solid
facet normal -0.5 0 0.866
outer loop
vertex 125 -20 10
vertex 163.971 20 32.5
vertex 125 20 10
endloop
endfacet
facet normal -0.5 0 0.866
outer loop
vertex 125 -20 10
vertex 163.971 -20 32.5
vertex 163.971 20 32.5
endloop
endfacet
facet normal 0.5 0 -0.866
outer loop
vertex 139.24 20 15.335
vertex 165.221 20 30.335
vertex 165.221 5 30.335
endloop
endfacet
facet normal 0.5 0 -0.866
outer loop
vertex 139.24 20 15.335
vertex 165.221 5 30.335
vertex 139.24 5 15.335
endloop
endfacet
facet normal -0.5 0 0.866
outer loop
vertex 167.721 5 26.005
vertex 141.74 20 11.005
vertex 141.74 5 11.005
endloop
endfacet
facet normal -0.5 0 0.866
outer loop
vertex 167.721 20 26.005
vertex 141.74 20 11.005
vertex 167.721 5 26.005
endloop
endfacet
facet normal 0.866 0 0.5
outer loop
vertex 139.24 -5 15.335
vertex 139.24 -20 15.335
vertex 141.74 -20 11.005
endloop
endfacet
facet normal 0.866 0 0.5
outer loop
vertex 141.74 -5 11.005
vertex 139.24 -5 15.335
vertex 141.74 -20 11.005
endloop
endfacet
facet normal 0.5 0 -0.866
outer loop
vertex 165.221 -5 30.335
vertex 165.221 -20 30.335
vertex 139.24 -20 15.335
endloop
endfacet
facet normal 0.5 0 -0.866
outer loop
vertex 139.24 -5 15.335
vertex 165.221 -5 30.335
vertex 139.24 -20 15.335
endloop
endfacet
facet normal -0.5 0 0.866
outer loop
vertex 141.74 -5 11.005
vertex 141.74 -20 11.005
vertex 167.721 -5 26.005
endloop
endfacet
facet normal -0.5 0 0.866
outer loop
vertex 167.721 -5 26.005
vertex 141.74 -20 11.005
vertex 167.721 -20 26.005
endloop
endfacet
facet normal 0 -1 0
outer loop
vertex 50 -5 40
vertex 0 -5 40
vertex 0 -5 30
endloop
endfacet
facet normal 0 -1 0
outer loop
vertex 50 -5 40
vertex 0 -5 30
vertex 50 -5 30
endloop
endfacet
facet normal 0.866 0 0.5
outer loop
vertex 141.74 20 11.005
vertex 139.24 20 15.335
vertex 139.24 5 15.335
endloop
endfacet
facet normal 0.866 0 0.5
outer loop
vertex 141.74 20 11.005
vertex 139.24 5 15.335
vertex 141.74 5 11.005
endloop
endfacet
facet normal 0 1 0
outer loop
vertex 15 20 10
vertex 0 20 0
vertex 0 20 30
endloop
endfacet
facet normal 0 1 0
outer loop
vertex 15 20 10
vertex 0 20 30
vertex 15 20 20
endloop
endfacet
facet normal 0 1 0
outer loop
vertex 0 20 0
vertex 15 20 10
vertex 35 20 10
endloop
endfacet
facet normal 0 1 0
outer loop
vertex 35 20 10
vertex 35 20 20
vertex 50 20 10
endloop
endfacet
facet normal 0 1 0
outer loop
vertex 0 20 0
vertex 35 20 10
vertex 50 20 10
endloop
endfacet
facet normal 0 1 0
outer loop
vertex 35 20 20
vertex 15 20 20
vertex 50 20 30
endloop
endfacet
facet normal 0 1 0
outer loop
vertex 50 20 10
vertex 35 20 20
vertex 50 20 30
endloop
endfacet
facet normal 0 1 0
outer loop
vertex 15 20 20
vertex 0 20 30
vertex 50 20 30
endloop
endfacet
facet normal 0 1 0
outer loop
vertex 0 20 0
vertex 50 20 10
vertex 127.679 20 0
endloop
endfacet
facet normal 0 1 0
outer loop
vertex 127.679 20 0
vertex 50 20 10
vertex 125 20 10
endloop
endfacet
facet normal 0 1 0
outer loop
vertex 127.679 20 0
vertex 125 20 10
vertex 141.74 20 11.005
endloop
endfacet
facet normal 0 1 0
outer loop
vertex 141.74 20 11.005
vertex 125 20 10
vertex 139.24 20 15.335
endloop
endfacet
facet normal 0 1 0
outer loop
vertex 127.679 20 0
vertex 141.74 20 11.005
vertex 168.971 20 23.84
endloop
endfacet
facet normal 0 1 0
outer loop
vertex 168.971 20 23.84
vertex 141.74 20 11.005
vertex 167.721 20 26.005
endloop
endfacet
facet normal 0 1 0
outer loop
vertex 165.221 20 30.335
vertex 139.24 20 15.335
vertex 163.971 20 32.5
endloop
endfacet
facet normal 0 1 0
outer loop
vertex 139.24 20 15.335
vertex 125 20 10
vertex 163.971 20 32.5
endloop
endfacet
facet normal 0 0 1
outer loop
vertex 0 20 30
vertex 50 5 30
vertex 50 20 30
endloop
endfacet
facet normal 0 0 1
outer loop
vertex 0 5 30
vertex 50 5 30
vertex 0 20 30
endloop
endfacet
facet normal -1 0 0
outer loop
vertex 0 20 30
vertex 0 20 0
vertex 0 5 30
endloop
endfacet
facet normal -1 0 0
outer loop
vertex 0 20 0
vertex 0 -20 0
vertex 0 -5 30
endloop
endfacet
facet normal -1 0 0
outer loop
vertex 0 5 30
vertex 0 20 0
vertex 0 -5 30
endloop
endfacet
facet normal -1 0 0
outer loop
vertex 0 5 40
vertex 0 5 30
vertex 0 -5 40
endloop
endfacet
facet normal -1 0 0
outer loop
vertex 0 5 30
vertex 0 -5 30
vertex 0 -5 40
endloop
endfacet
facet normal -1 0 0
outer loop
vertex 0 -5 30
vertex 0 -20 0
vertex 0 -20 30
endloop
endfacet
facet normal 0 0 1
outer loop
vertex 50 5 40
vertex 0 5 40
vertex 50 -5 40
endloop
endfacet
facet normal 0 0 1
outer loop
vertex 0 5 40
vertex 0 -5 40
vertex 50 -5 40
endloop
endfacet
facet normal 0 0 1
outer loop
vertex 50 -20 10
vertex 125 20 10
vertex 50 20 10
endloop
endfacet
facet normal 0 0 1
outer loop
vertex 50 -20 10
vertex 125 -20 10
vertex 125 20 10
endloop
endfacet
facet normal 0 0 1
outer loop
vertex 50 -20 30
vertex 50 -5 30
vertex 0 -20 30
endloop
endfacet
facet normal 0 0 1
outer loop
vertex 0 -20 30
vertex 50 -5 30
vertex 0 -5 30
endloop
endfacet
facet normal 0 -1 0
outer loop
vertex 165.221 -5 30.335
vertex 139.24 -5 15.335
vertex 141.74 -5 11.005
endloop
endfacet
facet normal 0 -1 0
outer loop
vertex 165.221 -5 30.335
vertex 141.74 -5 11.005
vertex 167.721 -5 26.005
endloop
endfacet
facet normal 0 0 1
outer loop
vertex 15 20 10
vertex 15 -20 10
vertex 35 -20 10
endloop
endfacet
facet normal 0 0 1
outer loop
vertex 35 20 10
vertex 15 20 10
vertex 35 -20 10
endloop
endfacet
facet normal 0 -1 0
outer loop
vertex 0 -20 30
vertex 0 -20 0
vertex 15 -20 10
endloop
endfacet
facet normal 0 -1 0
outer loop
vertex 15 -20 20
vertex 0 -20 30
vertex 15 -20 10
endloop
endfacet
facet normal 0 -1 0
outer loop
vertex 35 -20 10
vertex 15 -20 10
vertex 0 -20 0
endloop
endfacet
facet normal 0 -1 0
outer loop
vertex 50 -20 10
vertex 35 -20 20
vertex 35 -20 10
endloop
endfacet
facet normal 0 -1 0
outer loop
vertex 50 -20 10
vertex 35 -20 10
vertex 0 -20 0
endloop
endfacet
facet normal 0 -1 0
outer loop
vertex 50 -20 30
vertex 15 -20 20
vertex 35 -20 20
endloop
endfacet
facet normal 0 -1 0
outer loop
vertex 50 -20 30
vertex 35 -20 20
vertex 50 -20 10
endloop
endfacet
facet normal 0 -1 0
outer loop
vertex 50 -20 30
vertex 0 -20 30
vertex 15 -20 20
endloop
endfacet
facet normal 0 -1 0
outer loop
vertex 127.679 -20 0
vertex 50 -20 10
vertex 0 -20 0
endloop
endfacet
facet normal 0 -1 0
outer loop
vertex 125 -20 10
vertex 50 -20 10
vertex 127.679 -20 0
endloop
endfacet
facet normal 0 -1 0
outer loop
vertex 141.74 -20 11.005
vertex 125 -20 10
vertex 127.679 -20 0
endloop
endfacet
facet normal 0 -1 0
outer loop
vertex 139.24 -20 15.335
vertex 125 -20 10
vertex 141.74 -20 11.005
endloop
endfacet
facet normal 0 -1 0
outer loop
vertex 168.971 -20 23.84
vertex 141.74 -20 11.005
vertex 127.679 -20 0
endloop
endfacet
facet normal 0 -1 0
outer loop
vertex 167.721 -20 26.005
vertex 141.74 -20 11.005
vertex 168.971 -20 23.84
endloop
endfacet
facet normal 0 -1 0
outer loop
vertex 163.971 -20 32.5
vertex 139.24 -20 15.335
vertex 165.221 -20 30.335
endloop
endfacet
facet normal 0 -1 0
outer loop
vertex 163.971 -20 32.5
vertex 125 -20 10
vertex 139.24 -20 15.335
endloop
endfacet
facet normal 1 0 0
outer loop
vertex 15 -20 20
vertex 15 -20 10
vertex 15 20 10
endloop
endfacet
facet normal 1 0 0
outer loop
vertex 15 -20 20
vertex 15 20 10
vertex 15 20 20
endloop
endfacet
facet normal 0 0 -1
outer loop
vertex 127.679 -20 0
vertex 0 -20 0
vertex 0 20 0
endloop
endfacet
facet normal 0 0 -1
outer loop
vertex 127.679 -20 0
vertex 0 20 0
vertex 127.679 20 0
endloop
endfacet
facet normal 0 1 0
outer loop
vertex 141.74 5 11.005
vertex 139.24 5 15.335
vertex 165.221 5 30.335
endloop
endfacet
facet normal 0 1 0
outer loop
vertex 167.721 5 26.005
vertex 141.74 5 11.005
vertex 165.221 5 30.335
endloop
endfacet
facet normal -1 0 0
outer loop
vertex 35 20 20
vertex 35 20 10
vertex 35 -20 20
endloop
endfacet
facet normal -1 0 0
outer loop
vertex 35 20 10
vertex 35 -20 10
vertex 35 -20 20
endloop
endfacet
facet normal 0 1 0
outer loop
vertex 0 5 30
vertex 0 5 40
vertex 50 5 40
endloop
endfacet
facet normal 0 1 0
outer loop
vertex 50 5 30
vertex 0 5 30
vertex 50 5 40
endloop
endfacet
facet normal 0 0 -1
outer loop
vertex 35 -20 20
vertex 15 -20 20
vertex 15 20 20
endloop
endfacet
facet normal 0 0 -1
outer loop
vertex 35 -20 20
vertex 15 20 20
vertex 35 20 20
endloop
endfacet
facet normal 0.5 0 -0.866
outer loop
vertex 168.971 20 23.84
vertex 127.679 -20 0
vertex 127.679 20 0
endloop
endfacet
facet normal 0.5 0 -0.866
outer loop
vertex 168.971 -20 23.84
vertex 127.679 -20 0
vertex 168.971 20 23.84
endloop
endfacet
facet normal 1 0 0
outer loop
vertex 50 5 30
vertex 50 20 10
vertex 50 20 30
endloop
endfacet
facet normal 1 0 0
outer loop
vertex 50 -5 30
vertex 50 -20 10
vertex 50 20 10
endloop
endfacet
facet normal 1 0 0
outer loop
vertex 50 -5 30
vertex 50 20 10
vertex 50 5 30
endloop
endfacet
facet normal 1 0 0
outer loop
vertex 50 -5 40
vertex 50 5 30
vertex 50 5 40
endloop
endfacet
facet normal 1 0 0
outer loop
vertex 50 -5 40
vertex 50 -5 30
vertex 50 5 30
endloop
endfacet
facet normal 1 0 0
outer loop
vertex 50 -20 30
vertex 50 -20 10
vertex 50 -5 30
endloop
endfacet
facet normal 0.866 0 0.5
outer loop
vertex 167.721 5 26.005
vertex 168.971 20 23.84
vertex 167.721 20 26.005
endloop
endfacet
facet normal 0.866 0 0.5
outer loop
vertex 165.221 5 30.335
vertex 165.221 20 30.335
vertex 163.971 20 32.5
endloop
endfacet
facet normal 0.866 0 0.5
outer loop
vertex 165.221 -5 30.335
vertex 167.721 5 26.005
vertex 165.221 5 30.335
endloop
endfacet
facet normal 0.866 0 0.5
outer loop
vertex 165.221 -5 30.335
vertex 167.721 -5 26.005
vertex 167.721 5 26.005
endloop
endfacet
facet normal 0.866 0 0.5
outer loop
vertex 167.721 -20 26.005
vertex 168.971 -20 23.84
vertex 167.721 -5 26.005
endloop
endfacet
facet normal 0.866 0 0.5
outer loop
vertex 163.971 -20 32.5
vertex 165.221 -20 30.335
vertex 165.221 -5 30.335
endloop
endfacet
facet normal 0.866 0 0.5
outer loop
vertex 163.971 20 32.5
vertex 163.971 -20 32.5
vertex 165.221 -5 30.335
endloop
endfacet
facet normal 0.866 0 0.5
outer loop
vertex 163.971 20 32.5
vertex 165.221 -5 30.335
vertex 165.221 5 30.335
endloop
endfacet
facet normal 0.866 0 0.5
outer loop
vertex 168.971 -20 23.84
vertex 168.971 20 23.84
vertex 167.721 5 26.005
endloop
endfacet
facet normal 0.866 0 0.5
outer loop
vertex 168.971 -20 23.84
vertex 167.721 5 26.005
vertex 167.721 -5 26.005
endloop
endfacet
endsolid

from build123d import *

# Parameters (mm, degrees)
F0_W     = 20
F0_H     = 10
F1_DEPTH = 20
F0_W_2   = 50
F2_DEPTH = 5
F4_DEPTH = 15


with BuildPart() as f1:
    # F0 (on Front) → F1 (new body)
    with BuildSketch(Plane.XZ):
        Polygon((50, 30), (0, 30), (0, 0), (127.679492, 0), (168.971143, 23.839746), (163.971143, 32.5), (125, 10), (50, 10), align=None)
        with Locations((25, 15)):
            Rectangle(F0_W, F0_H, mode=Mode.SUBTRACT)
    extrude(amount=F1_DEPTH)

    # F0 (on Front) → F2 (join)
    with BuildSketch(Plane.XZ):
        with Locations((25, 35)):
            Rectangle(F0_W_2, F0_H)
    extrude(amount=F2_DEPTH)

    # F3 (on face) → F4 (cut)
    with BuildSketch(Plane.XZ.offset(20)):
        Polygon((167.721143, 26.004809), (165.221143, 30.334936), (139.240381, 15.334936), (141.740381, 11.004809), align=None)
    extrude(amount=-F4_DEPTH, mode=Mode.SUBTRACT)

    # F5: F1 across plane


with BuildPart() as f1_1:
    add(f1.part)
    add(f1.part.mirror(Plane.XZ))


solid = f1_1.part
